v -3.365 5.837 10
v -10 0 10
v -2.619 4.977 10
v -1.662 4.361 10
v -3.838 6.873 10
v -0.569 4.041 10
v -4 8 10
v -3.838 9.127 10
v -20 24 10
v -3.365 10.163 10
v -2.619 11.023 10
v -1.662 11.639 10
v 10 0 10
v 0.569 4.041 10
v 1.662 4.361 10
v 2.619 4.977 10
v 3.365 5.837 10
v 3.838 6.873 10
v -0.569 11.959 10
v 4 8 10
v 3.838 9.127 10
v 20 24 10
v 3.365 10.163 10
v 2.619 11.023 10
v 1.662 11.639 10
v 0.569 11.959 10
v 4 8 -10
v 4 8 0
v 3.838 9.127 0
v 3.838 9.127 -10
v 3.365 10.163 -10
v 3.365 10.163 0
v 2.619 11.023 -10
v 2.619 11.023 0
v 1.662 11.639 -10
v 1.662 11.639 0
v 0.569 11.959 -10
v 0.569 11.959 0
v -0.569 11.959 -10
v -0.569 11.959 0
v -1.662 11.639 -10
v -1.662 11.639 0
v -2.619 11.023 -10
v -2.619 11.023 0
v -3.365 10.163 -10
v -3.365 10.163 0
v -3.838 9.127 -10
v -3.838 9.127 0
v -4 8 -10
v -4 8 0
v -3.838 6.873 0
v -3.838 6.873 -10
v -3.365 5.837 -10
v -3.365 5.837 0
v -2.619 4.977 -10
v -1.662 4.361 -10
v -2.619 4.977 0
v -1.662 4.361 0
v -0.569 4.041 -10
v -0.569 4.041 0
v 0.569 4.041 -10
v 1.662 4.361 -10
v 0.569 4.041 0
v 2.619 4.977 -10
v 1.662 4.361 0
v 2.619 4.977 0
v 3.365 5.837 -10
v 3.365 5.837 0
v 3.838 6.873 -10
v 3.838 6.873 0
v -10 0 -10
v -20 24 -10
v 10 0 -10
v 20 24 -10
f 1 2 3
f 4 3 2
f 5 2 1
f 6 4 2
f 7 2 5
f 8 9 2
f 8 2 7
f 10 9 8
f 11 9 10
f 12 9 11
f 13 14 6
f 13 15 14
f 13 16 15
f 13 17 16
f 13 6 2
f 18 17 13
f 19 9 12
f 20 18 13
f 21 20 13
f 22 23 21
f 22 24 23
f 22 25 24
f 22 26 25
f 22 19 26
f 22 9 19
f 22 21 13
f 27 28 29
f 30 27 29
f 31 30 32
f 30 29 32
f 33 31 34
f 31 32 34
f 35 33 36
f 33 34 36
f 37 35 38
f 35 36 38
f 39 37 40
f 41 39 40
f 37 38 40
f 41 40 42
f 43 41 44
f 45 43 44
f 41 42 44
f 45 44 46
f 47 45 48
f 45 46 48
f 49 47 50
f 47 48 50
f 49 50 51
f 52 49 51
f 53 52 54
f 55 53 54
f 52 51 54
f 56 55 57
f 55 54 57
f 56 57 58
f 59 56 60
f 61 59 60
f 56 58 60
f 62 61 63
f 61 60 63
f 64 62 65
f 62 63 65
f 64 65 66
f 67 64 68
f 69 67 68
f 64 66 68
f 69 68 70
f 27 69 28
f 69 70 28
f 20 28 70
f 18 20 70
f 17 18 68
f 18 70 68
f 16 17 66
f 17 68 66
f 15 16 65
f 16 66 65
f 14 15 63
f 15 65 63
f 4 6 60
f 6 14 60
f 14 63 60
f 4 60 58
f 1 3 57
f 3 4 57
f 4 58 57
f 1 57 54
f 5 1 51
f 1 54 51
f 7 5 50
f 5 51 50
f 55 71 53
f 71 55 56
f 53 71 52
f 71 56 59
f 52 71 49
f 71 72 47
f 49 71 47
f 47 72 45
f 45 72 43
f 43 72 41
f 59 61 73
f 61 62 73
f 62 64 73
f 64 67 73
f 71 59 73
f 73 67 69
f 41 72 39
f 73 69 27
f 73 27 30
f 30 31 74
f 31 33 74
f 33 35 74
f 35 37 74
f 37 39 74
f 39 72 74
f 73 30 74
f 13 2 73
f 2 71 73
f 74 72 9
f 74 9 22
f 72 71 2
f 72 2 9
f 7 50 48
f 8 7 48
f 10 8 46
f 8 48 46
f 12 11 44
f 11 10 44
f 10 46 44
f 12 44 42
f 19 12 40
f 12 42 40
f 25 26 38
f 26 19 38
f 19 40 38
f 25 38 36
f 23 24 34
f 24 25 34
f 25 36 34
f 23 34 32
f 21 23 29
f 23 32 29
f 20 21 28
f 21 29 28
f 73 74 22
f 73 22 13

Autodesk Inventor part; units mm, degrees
ref_plane "YZ Plane" through (0, 0, 0) normal (1, 0, 0) x (0, 1, 0)
ref_plane "XZ Plane" through (0, 0, 0) normal (0, 1, 0) x (-1, 0, 0)
ref_plane "XY Plane" through (0, 0, 0) normal (0, 0, 1) x (1, 0, 0)
sketch "Эскиз1" plane through (0, 0, 0) normal (0, 0, 1) x (1, 0, 0)
  line L0 (-10, 0) -> (10, 0)
  line L1 (-20, 24) -> (20, 24)
  line L2 (20, 24) -> (10, 0)
  line L3 (-10, 0) -> (-20, 24)
  circle A0 centre (0, 8) radius 4
  line L4 (-20, 24) -> (-20, 30)
  line L5 (-20, 30) -> (20, 30)
  line L6 (20, 30) -> (20, 24)
  line L7 (-5.2413, 8) -> (5.4825, 8)
  point P0 (0, 0)
  dimension "d0" = 20
  dimension "d1" = 40
  dimension "d3" = 8
  dimension "d5" = 24
  dimension "d6" = 6
  dimension "d7" = 16
extrude "Выдавливание1" add sketch "Эскиз1" along normal mid plane 20 contours L3 L1 L2 L0
properties part number "2"
